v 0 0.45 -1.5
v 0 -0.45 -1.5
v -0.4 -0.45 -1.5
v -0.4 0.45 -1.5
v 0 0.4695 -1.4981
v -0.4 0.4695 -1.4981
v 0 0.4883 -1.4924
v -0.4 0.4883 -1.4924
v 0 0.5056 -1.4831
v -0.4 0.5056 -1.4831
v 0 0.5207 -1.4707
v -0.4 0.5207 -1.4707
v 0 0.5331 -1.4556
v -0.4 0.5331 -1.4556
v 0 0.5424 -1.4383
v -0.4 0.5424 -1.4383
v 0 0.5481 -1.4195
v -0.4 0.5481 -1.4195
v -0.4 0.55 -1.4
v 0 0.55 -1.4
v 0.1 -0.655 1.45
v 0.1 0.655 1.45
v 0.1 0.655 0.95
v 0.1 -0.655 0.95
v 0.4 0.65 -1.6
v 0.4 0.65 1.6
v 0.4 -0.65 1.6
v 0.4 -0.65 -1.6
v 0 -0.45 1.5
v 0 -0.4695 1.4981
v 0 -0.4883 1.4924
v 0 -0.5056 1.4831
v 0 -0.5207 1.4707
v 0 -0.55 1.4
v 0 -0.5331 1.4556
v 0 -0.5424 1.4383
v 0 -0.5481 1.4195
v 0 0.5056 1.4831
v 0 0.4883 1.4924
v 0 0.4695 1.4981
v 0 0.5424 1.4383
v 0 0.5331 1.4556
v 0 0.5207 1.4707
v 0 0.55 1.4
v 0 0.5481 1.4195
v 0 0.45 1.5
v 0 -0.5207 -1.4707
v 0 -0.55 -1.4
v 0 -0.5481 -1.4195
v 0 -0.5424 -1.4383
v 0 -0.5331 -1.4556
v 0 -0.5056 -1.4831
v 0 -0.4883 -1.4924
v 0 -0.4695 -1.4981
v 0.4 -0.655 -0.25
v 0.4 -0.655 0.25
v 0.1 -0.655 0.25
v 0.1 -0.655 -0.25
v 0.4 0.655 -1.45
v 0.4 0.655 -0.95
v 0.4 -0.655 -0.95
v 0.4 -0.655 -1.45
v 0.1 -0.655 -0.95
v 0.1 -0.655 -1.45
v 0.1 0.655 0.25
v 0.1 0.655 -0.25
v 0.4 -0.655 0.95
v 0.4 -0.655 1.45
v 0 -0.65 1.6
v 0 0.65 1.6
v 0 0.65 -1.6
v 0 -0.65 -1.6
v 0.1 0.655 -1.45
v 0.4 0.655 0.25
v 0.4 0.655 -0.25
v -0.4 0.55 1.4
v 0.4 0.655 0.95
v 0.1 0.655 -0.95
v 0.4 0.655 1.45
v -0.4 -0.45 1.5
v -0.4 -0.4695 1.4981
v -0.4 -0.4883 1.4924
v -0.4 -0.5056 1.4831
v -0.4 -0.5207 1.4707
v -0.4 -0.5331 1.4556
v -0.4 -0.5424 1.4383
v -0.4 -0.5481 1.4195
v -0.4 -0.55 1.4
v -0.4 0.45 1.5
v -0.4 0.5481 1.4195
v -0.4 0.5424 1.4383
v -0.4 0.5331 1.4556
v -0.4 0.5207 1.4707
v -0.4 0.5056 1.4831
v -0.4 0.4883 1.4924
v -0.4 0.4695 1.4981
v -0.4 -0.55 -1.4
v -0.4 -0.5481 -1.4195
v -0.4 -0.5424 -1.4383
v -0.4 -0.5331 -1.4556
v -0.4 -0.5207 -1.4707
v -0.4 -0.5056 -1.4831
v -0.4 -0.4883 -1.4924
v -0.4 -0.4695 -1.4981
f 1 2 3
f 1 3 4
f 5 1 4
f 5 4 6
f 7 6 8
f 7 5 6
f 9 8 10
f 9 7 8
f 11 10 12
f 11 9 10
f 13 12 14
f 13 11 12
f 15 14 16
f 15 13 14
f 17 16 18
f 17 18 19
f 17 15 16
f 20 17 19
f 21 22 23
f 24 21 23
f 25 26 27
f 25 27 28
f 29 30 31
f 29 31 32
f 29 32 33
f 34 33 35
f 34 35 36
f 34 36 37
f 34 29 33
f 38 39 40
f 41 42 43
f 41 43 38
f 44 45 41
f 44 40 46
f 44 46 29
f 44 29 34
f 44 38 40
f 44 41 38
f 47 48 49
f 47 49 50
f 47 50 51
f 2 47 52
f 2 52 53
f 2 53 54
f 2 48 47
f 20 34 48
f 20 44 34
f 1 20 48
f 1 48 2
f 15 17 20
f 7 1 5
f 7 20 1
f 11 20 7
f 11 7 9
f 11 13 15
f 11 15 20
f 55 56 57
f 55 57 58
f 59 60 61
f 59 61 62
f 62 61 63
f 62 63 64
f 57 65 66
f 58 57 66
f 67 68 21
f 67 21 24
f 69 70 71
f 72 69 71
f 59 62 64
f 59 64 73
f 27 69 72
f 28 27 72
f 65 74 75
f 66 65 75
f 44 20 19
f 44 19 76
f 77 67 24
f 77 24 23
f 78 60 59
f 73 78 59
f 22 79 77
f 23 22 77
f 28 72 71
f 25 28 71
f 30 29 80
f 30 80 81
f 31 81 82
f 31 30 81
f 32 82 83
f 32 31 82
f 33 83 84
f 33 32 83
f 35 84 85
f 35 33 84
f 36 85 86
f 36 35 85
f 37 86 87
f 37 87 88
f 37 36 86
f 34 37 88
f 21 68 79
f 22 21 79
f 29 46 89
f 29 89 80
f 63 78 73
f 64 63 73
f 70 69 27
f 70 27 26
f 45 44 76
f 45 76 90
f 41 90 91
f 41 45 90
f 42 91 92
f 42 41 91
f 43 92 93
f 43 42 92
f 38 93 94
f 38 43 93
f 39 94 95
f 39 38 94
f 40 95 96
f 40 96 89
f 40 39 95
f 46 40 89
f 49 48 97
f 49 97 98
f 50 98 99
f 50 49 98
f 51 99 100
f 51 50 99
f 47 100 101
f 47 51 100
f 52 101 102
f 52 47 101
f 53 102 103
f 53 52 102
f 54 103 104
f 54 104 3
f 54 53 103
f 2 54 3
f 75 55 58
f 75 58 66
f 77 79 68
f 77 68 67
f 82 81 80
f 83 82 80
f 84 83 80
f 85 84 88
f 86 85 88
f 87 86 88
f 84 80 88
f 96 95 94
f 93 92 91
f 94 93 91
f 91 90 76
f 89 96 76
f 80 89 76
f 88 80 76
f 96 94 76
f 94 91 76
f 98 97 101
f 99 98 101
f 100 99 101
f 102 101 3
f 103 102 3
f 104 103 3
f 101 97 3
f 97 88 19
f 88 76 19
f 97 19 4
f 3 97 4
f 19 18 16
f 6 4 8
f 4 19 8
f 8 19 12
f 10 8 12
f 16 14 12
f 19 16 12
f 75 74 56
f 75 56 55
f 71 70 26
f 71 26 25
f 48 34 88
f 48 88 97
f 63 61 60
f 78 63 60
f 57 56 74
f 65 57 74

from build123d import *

# Parameters (mm, degrees)
SKETCH_1_W        = 3.2
SKETCH_1_H        = 1.3
EXTRUDE_1_DEPTH   = 0.4
EXTRUDE_2_DEPTH   = 0.4
SKETCH_3_W        = 0.5
SKETCH_3_H        = 1.31
EXTRUDE_3_DEPTH   = 0.3
EXTRUDE_3_2_DEPTH = 0.3
EXTRUDE_3_3_DEPTH = 0.3


with BuildPart() as part:
    # Эскиз1 → Бобышка-Вытянуть1 (new body)
    with BuildSketch(Plane(origin=(0, 0, 0), x_dir=(0, 0, -1), z_dir=(1, 0, 0))):
        Rectangle(SKETCH_1_W, SKETCH_1_H)
    extrude(amount=EXTRUDE_1_DEPTH)


with BuildPart() as body_2:
    # Эскиз2 → Бобышка-Вытянуть2 (new body)
    with BuildSketch(Plane.ZY):
        with BuildLine():
            Line((-1.4, 0.55), (1.4, 0.55))
            ThreePointArc((1.4, 0.55), (1.470710678, 0.520710678), (1.5, 0.45))
            Line((1.5, 0.45), (1.5, -0.45))
            ThreePointArc((1.5, -0.45), (1.470710678, -0.520710678), (1.4, -0.55))
            Line((1.4, -0.55), (-1.4, -0.55))
            ThreePointArc((-1.4, -0.55), (-1.470710678, -0.520710678), (-1.5, -0.45))
            Line((-1.5, -0.45), (-1.5, 0.45))
            ThreePointArc((-1.5, 0.45), (-1.470710678, 0.520710678), (-1.4, 0.55))
        make_face()
    extrude(amount=EXTRUDE_2_DEPTH)


with BuildPart() as body_3:
    # Эскиз3 → Бобышка-Вытянуть3 (new body)
    with BuildSketch(Plane(origin=(0.4, 0, 0), x_dir=(0, 0, -1), z_dir=(1, 0, 0))):
        Rectangle(SKETCH_3_W, SKETCH_3_H)
    extrude(amount=-EXTRUDE_3_DEPTH)


with BuildPart() as body_4:
    # Эскиз3 → Extrude 3 2 (new body)
    with BuildSketch(Plane(origin=(0.4, 0, 0), x_dir=(0, 0, -1), z_dir=(1, 0, 0))):
        with Locations((1.2, 0)):
            Rectangle(SKETCH_3_W, SKETCH_3_H)
    extrude(amount=-EXTRUDE_3_2_DEPTH)


with BuildPart() as body_5:
    # Эскиз3 → Extrude 3 3 (new body)
    with BuildSketch(Plane(origin=(0.4, 0, 0), x_dir=(0, 0, -1), z_dir=(1, 0, 0))):
        with Locations((-1.2, 0)):
            Rectangle(SKETCH_3_W, SKETCH_3_H)
    extrude(amount=-EXTRUDE_3_3_DEPTH)


solid = Compound([part.part, body_2.part, body_3.part, body_4.part, body_5.part])
